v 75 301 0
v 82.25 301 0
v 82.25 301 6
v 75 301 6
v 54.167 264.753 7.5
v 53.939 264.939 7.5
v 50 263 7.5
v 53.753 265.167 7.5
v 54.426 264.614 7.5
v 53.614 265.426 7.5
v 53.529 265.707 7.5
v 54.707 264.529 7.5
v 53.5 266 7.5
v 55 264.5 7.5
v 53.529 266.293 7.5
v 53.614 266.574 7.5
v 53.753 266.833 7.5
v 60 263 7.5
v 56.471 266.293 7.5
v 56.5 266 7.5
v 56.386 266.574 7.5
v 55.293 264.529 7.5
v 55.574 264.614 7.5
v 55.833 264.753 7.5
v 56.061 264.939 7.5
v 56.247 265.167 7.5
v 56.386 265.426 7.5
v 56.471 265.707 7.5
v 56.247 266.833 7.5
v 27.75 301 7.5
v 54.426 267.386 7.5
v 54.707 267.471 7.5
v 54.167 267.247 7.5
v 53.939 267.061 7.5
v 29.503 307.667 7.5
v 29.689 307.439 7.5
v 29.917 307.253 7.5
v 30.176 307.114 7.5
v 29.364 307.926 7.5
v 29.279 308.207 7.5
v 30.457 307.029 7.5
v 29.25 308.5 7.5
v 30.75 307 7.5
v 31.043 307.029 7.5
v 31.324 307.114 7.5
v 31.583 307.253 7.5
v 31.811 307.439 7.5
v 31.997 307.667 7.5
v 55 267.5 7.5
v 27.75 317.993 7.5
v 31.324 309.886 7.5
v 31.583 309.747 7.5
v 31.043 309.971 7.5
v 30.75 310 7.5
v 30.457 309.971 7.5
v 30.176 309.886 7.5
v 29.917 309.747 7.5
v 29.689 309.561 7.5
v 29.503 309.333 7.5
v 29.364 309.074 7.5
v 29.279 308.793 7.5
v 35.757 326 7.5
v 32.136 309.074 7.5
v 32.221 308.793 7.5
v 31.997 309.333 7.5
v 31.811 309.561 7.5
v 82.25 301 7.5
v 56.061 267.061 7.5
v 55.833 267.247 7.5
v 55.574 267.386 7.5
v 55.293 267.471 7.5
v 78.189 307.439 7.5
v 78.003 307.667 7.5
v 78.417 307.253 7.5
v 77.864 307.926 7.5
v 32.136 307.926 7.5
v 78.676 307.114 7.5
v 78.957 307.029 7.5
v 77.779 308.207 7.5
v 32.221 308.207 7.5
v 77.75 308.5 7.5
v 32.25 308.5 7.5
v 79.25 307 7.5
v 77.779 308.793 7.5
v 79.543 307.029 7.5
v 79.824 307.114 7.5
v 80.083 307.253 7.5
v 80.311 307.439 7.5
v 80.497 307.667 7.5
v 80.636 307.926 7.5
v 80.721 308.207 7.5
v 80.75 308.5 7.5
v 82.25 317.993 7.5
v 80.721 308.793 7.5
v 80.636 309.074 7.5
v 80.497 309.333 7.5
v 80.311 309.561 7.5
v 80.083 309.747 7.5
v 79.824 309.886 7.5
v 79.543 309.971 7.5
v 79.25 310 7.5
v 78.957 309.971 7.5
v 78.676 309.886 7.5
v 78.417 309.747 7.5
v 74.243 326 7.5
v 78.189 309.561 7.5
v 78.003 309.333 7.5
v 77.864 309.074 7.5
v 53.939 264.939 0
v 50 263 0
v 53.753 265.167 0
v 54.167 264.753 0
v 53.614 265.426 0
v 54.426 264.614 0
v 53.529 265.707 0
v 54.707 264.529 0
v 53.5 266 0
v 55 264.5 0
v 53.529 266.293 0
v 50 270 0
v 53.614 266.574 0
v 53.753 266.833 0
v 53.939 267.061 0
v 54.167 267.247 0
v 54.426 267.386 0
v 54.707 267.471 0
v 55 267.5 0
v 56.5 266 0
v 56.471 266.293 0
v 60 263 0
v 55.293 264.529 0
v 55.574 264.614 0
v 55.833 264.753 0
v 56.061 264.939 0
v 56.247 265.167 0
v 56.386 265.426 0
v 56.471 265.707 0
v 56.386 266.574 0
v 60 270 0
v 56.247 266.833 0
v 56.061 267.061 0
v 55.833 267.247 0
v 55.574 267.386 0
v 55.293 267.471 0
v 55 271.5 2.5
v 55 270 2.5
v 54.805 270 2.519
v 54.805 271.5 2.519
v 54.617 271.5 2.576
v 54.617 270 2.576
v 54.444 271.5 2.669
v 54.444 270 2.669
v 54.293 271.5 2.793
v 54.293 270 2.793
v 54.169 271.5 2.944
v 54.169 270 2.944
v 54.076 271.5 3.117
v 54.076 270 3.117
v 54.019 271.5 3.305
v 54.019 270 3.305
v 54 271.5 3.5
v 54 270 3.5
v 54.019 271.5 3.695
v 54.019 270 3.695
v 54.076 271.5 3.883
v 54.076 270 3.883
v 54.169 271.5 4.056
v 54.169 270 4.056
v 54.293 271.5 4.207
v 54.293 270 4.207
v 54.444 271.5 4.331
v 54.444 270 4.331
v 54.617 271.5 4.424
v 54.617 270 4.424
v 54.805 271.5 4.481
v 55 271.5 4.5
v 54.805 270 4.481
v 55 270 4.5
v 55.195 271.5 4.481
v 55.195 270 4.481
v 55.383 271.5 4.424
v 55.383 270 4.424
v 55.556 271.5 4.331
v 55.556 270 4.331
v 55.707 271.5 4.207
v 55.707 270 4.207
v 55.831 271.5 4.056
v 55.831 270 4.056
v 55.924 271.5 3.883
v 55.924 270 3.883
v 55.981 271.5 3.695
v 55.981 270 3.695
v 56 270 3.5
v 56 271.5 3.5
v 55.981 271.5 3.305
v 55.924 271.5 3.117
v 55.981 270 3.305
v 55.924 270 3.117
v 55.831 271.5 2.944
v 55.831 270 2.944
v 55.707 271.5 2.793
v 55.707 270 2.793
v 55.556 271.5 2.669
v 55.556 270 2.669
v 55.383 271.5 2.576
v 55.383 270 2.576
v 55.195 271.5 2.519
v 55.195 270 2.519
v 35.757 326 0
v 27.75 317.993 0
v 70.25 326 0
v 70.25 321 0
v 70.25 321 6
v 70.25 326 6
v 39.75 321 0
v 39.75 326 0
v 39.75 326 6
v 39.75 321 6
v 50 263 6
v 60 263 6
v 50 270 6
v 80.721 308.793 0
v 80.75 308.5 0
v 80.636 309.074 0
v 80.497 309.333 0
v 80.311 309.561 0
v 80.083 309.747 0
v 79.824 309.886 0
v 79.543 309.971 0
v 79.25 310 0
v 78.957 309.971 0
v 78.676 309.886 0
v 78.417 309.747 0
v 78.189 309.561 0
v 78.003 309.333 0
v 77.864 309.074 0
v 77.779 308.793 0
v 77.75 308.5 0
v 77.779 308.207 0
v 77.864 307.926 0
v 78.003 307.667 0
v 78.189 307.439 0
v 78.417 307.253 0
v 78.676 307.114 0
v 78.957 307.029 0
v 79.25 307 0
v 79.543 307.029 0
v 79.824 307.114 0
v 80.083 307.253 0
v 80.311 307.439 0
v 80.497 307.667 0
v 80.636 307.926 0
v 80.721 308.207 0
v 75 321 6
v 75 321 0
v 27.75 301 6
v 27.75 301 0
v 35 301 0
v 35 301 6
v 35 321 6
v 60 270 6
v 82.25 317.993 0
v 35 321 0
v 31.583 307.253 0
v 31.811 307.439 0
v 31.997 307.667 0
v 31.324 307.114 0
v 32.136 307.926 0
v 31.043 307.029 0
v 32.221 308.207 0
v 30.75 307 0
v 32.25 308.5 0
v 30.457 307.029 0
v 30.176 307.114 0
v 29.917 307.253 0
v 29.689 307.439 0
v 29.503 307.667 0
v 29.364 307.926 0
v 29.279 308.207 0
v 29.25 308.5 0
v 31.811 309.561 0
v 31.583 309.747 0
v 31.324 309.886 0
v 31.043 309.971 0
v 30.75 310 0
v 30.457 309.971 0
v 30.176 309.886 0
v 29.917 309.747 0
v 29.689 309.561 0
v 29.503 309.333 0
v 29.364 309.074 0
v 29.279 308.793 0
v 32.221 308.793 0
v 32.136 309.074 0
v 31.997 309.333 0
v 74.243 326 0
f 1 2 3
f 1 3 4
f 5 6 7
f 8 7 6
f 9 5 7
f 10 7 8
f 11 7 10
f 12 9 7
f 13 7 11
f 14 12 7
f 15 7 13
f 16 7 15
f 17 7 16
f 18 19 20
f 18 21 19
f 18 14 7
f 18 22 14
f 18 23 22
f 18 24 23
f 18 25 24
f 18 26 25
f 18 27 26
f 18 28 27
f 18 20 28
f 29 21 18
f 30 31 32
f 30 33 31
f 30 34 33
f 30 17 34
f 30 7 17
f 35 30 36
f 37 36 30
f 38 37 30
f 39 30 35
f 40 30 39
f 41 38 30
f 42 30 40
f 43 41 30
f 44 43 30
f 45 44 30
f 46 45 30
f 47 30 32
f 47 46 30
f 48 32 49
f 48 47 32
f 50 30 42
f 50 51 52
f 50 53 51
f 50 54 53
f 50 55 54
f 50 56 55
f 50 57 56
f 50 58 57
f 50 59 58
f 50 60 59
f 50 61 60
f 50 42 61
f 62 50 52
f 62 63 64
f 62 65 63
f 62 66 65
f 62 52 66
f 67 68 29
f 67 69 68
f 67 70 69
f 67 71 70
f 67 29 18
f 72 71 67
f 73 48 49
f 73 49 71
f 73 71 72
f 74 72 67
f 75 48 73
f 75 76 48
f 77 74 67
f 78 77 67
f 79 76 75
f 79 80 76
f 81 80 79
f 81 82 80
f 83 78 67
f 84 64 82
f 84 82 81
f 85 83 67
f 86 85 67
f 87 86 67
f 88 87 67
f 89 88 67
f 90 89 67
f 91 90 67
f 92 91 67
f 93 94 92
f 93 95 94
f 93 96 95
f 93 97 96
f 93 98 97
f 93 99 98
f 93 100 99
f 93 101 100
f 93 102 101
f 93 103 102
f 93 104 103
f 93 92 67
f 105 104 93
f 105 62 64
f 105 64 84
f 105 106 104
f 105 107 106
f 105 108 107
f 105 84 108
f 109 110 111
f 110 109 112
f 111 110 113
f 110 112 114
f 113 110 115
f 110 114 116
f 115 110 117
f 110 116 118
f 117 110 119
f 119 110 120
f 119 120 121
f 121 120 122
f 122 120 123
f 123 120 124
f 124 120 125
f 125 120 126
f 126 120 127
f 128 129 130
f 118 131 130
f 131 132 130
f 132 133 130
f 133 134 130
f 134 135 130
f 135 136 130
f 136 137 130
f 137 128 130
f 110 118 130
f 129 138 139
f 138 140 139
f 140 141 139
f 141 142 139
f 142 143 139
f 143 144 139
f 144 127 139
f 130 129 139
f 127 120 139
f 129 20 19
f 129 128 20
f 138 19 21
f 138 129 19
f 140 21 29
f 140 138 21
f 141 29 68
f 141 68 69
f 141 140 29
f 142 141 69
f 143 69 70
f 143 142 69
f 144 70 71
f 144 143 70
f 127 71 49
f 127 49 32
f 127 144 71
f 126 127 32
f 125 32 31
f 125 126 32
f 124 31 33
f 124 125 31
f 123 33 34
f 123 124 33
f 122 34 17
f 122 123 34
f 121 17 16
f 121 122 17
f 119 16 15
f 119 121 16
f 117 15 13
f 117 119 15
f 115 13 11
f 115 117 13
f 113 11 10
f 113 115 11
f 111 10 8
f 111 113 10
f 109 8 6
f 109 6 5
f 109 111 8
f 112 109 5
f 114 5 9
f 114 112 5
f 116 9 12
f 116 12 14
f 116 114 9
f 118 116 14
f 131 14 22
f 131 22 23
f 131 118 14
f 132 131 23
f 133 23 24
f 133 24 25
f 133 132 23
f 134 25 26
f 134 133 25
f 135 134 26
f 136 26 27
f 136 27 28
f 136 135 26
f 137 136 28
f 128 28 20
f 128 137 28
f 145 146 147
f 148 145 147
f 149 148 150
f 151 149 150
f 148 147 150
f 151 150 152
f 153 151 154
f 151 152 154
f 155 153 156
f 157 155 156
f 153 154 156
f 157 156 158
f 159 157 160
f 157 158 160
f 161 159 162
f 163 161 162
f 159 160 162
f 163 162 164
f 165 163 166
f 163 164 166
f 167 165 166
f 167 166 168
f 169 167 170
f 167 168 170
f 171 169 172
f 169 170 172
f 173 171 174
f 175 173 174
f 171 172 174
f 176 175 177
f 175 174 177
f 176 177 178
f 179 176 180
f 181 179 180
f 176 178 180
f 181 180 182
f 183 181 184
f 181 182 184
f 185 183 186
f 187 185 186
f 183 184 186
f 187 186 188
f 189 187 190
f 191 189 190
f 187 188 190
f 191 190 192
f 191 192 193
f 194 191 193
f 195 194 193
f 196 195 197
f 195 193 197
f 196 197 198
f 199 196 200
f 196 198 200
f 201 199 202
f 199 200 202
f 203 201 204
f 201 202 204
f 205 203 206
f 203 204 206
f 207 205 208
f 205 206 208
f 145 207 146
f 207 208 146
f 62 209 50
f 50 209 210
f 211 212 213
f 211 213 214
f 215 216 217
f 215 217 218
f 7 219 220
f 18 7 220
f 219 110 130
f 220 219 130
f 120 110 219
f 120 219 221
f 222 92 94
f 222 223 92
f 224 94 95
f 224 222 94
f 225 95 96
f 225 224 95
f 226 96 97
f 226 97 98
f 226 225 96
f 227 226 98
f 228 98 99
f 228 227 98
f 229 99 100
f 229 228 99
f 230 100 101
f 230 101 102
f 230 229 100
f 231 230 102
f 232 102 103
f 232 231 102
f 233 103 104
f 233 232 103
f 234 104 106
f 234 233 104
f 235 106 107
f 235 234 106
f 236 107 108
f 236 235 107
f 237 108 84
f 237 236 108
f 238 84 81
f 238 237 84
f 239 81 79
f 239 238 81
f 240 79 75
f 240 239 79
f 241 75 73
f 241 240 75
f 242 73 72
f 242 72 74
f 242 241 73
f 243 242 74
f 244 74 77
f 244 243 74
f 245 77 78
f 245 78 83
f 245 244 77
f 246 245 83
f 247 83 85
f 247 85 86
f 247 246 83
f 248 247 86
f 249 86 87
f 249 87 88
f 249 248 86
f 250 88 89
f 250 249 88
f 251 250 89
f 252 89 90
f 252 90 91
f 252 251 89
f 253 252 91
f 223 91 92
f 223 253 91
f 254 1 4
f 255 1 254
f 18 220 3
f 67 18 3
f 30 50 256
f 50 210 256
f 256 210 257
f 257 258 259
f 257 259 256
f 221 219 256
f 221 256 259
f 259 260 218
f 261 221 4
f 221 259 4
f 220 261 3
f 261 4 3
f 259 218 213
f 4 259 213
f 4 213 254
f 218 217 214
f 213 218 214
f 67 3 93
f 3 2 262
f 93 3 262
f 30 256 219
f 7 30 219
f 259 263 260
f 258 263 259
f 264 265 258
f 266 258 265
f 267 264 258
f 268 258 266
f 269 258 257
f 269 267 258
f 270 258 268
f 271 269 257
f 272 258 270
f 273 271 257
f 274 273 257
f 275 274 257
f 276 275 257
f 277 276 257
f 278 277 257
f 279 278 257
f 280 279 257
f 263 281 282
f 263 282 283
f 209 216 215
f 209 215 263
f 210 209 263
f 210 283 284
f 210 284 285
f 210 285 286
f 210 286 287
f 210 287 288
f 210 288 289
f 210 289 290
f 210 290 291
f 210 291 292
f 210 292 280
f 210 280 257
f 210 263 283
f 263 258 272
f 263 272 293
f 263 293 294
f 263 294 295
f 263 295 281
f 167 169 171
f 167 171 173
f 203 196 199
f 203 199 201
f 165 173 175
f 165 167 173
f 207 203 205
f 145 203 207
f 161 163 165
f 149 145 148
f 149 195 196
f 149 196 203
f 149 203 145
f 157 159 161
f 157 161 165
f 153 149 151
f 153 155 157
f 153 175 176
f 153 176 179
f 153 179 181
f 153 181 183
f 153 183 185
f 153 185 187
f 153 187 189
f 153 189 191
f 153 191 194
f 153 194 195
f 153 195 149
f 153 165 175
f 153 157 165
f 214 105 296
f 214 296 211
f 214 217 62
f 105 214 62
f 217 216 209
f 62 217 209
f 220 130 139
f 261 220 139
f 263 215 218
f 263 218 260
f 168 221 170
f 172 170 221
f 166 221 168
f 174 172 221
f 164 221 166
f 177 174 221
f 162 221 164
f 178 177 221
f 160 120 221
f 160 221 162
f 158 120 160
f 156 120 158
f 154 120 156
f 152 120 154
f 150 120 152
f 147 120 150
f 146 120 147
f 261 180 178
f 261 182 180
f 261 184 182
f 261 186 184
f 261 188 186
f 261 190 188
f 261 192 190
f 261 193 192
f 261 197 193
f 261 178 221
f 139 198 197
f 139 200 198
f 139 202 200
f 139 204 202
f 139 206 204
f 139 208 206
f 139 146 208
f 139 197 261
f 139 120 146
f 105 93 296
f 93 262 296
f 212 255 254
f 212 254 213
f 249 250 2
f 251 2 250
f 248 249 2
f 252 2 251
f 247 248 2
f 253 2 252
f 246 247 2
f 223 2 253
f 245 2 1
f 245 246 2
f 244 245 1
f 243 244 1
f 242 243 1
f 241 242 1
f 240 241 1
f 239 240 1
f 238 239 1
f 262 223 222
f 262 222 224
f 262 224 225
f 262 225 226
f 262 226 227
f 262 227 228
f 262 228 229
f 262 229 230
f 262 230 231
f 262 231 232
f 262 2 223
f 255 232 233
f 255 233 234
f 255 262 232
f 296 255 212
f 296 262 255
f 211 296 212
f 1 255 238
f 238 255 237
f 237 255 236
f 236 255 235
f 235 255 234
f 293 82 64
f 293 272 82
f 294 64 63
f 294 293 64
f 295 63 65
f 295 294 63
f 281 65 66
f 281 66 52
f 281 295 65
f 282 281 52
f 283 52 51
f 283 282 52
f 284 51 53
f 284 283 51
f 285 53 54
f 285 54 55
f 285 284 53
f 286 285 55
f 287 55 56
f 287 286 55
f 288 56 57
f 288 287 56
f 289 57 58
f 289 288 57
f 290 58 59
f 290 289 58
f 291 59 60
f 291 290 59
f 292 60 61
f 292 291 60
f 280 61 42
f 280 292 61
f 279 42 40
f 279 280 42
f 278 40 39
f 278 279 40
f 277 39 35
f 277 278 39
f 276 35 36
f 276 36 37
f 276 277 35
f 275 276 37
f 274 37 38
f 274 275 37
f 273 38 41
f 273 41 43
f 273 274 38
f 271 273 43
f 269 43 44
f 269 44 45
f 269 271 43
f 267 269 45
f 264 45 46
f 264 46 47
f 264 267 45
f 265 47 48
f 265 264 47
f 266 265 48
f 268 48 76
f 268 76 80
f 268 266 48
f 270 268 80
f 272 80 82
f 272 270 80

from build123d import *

# Parameters (mm, degrees)
SKETCH_1_R        = 1.5
EXTRUDE_1_DEPTH   = 6
EXTRUDE_1_2_DEPTH = 6
SKETCH_1_W        = 10
SKETCH_1_H        = 7
EXTRUDE_1_3_DEPTH = 6
SKETCH_2_R        = 1.5
EXTRUDE_2_DEPTH   = 1.5
SKETCH_3_R        = 1
EXTRUDE_3_DEPTH   = 1.5


with BuildPart() as part:
    # Эскиз1 → Бобышка-Вытянуть1 (new body)
    with BuildSketch(Plane.XY):
        Polygon((39.75, 326), (39.75, 321), (35, 321), (35, 301), (27.75, 301), (27.75, 317.992640687), (35.757359313, 326), align=None)
        with Locations((30.75, 308.5)):
            Circle(SKETCH_1_R, mode=Mode.SUBTRACT)
    extrude(amount=EXTRUDE_1_DEPTH)



with BuildPart() as body_2:
    # Эскиз1 → Extrude 1 2 (new body)
    with BuildSketch(Plane.XY):
        Polygon((82.25, 301), (75, 301), (75, 321), (70.25, 321), (70.25, 326), (74.242640687, 326), (82.25, 317.992640687), align=None)
        with Locations((79.25, 308.5)):
            Circle(SKETCH_1_R, mode=Mode.SUBTRACT)
    extrude(amount=EXTRUDE_1_2_DEPTH)


with BuildPart() as body_3:
    # Эскиз1 → Extrude 1 3 (new body)
    with BuildSketch(Plane.XY):
        with Locations((55, 266.5)):
            Rectangle(SKETCH_1_W, SKETCH_1_H)
        with Locations((55, 266)):
            Circle(SKETCH_1_R, mode=Mode.SUBTRACT)
    extrude(amount=EXTRUDE_1_3_DEPTH)


with BuildPart() as part_1:
    add(part.part)

    add(body_2.part)  # Бобышка-Вытянуть2 merges body 2

    add(body_3.part)  # Бобышка-Вытянуть2 merges body 3
    # Эскиз2 → Бобышка-Вытянуть2 (add)
    with BuildSketch(Plane.XY.offset(6)):
        Polygon((82.25, 301), (82.25, 317.992640687), (74.242640687, 326), (70.25, 326), (39.75, 326), (35.757359313, 326), (27.75, 317.992640687), (27.75, 301), (50, 263), (60, 263), align=None)
        with Locations((55, 266)):
            Circle(SKETCH_2_R, mode=Mode.SUBTRACT)
        with Locations((79.25, 308.5)):
            Circle(SKETCH_2_R, mode=Mode.SUBTRACT)
        with Locations((30.75, 308.5)):
            Circle(SKETCH_2_R, mode=Mode.SUBTRACT)
    extrude(amount=EXTRUDE_2_DEPTH)

    # Эскиз3 → Бобышка-Вытянуть3 (add)
    with BuildSketch(Plane(origin=(0, 270, 0), x_dir=(1, 0, 0), z_dir=(0, 1, 0))):
        with Locations(Location((55, -3.5, 0), (0, 0, 90))):
            Circle(SKETCH_3_R)
    extrude(amount=EXTRUDE_3_DEPTH)


solid = part_1.part
